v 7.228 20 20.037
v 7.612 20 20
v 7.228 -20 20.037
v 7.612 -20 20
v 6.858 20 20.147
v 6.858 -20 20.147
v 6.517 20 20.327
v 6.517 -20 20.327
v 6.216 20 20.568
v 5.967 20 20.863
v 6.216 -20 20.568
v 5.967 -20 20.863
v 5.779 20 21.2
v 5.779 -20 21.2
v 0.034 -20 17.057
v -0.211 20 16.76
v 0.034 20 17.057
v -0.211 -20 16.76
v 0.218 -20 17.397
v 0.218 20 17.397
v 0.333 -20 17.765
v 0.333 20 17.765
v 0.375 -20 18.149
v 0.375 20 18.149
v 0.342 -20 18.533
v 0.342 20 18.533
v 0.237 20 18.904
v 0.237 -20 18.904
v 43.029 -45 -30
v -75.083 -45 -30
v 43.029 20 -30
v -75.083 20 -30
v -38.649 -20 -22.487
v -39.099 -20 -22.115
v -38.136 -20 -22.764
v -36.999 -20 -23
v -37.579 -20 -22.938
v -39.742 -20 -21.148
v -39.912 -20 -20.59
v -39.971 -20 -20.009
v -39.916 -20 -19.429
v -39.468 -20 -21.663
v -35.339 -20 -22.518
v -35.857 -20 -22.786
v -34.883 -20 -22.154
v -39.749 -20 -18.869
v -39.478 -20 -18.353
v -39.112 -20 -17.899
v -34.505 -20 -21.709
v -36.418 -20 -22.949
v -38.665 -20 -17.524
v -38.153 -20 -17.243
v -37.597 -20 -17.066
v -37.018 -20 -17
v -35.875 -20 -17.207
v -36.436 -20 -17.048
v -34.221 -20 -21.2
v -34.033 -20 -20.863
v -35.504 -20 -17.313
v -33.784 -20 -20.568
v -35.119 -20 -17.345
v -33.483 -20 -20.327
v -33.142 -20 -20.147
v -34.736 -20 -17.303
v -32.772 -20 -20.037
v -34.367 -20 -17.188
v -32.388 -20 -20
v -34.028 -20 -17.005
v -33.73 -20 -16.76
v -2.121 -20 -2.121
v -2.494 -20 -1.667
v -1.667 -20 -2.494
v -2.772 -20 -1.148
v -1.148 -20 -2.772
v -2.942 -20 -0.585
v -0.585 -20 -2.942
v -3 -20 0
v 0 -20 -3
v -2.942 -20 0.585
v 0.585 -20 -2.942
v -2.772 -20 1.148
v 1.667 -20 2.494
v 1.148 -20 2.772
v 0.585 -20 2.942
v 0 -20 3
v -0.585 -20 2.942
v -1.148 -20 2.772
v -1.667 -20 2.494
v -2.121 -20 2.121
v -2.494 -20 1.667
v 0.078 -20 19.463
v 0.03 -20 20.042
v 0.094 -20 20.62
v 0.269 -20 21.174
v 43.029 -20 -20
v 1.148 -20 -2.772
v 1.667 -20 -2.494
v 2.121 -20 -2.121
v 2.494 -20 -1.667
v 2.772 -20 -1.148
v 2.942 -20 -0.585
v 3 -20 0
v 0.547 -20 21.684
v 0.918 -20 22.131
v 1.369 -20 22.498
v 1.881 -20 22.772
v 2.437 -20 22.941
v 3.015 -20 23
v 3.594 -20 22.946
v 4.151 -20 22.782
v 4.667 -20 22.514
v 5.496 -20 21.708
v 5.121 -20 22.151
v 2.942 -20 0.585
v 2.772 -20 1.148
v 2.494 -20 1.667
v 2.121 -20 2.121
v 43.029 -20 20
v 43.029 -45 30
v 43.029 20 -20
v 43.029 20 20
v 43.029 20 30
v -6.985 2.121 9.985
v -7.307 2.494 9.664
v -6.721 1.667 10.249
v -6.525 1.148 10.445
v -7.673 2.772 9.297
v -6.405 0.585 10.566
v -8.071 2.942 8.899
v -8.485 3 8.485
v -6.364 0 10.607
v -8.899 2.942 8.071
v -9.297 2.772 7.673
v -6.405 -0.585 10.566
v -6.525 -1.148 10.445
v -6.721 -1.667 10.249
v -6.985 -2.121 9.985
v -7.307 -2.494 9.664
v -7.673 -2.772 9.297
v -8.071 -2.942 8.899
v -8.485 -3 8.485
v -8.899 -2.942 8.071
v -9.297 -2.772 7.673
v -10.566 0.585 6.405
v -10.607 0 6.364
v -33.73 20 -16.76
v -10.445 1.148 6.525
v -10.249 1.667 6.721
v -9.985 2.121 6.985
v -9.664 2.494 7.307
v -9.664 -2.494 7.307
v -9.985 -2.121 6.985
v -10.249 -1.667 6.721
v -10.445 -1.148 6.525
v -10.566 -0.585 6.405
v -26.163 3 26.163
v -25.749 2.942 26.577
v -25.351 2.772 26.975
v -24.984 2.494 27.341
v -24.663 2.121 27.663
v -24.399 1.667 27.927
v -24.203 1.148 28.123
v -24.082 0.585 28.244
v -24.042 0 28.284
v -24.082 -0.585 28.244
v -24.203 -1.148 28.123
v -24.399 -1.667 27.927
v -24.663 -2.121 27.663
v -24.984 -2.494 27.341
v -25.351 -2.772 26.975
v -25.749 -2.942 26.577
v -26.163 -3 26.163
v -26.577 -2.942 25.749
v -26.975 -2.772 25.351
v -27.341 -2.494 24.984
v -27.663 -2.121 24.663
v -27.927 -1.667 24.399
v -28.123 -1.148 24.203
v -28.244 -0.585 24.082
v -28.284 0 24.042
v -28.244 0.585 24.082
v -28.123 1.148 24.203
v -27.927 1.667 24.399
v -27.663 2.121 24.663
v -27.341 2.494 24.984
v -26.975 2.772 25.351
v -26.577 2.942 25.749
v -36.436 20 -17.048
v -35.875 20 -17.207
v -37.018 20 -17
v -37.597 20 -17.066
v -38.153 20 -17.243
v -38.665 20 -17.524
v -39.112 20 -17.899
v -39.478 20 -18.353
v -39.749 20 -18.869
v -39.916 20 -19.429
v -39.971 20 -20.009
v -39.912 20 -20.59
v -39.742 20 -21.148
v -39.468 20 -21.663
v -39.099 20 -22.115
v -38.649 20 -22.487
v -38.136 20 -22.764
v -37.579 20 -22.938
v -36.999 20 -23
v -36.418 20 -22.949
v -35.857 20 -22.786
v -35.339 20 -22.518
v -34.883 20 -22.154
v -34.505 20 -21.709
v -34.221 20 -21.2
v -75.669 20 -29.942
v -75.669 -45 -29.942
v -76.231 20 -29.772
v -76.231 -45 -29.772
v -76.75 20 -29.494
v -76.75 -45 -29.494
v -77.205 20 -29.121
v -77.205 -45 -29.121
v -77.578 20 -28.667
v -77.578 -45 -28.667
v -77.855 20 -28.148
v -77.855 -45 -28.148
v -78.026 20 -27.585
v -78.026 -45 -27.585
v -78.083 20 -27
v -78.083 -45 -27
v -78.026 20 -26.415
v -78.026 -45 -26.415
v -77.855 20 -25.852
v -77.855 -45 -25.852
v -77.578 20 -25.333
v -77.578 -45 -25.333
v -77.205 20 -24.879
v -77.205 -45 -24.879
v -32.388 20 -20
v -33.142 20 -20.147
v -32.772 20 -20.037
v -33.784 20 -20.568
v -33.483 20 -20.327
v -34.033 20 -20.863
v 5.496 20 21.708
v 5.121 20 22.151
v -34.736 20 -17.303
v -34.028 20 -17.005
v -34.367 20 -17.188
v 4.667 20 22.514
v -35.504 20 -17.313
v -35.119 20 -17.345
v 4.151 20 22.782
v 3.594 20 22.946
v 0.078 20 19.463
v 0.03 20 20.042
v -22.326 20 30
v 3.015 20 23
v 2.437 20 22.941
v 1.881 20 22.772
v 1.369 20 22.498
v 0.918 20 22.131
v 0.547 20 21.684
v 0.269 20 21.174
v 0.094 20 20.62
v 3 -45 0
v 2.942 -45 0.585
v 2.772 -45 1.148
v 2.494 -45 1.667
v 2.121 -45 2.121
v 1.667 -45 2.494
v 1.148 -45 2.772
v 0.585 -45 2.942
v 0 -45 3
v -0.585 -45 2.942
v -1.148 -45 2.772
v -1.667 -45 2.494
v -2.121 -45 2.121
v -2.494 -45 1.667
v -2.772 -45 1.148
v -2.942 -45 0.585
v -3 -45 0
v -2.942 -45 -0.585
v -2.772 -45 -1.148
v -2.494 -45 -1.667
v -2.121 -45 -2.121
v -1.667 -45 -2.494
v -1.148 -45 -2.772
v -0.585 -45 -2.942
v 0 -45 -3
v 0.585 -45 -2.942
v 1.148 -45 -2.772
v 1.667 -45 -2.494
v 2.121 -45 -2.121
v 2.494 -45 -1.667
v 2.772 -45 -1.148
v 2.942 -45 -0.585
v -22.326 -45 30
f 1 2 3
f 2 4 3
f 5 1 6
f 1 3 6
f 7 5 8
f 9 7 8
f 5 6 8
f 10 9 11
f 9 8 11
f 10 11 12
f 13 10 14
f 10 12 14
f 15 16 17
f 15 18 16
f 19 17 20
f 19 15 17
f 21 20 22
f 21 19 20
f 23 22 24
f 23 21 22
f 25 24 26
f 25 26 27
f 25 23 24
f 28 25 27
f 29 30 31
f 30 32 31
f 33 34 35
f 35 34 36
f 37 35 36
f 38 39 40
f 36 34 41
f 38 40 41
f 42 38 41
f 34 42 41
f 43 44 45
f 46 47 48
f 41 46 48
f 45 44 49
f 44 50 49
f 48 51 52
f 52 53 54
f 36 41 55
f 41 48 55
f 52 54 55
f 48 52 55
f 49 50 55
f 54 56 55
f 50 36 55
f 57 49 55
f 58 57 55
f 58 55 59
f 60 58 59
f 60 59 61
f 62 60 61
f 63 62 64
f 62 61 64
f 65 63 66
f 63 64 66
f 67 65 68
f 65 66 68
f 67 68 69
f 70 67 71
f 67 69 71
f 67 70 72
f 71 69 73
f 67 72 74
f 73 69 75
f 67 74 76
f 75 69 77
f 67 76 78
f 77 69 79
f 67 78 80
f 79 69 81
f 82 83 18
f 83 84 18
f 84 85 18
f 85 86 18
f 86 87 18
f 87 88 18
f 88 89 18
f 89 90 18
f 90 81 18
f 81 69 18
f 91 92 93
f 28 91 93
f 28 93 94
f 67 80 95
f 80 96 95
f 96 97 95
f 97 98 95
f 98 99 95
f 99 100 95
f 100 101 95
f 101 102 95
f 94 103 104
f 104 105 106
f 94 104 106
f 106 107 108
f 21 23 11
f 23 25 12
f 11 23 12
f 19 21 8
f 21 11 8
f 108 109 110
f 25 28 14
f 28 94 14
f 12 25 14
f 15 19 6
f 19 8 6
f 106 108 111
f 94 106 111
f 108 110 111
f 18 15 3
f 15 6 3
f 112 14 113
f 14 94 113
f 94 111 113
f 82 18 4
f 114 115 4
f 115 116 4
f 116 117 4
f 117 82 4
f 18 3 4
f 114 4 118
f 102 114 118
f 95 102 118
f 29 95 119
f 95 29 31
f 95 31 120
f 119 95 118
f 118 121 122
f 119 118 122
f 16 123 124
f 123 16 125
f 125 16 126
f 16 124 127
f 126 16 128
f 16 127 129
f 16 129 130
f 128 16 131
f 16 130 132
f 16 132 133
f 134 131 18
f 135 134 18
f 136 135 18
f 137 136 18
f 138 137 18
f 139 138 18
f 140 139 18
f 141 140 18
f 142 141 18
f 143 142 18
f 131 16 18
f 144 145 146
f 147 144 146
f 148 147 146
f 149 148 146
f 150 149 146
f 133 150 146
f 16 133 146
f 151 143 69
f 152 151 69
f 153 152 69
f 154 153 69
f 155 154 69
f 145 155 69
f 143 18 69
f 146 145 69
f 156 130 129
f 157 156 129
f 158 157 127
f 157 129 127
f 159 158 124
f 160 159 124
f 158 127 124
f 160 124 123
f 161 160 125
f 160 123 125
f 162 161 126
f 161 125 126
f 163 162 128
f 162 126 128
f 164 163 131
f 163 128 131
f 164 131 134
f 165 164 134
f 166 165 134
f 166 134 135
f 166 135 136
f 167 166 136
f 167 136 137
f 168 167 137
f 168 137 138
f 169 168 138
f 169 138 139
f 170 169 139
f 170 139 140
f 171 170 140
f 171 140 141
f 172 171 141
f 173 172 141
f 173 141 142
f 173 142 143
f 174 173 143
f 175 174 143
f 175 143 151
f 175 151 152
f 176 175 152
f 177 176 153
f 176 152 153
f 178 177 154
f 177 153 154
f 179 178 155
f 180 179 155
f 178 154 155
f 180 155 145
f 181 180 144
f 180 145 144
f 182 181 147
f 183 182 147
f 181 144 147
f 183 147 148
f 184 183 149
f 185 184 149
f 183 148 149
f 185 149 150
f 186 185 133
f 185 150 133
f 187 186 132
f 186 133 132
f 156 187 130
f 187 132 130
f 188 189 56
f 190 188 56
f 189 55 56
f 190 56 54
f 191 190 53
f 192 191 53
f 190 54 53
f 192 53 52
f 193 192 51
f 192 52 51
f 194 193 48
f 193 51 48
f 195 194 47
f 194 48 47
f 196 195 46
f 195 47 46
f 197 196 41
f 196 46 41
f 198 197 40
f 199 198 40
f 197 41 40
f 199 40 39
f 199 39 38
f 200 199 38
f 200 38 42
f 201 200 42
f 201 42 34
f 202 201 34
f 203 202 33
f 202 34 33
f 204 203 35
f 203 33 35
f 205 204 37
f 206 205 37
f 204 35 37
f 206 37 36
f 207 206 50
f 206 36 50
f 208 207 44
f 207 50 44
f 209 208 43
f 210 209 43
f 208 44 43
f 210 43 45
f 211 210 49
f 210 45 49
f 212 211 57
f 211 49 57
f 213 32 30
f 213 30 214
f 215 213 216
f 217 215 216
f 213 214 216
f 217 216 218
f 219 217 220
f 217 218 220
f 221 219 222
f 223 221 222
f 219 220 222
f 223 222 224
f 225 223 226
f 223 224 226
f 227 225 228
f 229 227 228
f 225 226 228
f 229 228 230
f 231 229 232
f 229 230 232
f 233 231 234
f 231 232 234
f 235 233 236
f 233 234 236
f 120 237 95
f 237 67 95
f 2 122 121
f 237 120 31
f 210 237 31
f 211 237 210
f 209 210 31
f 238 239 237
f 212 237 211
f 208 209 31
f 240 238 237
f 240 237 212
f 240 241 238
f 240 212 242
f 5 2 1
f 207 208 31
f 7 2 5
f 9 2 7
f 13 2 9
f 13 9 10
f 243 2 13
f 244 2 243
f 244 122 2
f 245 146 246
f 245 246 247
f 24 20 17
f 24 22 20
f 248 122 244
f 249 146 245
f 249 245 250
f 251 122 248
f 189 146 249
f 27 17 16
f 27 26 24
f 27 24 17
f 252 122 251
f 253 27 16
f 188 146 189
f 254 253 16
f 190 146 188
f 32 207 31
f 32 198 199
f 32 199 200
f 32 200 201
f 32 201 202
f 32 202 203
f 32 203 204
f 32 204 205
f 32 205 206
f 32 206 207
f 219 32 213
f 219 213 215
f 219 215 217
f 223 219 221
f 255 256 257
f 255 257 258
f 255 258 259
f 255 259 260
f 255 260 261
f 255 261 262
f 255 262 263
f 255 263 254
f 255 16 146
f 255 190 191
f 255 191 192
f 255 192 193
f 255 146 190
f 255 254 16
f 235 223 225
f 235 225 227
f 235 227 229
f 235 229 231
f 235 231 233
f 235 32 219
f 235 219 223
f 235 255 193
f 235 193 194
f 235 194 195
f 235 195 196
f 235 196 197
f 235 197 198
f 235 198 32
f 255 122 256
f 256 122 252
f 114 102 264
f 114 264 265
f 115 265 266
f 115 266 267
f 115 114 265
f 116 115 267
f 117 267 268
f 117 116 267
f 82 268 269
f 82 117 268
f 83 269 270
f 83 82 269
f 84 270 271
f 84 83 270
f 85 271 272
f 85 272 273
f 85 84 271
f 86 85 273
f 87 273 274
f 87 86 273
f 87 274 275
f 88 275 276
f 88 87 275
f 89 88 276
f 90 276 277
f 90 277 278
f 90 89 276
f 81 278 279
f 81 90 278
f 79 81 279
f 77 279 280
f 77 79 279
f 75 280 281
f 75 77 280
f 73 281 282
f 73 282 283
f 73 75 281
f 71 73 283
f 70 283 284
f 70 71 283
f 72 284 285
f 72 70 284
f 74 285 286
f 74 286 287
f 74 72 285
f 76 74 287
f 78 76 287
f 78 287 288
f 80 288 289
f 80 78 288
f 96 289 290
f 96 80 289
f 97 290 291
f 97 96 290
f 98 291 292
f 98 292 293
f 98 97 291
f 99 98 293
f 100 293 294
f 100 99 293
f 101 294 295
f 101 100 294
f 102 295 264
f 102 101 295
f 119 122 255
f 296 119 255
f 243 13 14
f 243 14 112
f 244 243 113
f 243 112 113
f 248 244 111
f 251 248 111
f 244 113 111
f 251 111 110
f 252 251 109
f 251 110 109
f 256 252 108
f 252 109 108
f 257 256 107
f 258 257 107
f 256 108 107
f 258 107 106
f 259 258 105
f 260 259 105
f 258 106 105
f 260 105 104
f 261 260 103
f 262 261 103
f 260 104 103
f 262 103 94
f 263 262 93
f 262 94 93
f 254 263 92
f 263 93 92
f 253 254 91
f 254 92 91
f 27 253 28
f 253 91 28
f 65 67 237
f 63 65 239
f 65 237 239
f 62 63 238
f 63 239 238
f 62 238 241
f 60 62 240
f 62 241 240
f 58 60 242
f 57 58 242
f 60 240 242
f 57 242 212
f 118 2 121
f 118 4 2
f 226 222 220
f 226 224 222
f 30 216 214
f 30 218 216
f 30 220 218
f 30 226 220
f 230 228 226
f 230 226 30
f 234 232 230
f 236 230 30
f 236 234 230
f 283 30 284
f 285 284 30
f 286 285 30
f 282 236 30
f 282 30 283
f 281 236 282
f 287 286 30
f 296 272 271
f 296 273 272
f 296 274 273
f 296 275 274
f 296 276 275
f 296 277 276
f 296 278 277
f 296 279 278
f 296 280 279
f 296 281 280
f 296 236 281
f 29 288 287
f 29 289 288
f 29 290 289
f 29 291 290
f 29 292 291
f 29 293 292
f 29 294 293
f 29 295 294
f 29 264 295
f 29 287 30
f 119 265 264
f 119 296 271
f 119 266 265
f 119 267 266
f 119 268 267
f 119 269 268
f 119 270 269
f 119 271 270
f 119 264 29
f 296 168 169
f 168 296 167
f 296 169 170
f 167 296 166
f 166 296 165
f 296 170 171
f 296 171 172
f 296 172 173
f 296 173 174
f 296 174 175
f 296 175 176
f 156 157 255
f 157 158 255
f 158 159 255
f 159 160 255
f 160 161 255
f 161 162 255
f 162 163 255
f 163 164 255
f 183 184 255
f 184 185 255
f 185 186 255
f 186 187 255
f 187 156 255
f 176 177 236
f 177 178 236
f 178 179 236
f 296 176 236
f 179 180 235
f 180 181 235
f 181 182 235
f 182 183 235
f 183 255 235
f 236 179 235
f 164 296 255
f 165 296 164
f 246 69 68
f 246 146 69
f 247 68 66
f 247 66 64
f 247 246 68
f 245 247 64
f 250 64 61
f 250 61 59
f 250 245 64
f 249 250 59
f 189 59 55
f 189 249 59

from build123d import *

# Parameters (mm, degrees)
PAD_DEPTH    = 20
SKETCH001_R  = 3
PAD001_DEPTH = 25
SKETCH002_R  = 3
POCKET_DEPTH = 79.427407
FILLET_R     = 2
FILLET001_R  = 3


with BuildPart() as part:
    # Sketch → Pad (new body, symmetric)
    with BuildSketch(Plane.XZ):
        with BuildLine():
            Line((0.908117, 17.87868), (-34.849242, -17.87868))
            ThreePointArc((-34.849242, -17.87868), (-39.742201, -21.14805), (-33.970563, -20))
            Line((-33.970563, -20), (43.029437, -20))
            Line((43.029437, -20), (43.029437, -30))
            Line((43.029437, -30), (-82.325902, -30))
            Line((-22.325902, 30), (-82.325902, -30))
            Line((43.029437, 30), (-22.325902, 30))
            Line((43.029437, 20), (43.029437, 30))
            Line((6.029437, 20), (43.029437, 20))
            ThreePointArc((6.029437, 20), (1.881387, 22.771639), (0.908117, 17.87868))
        make_face()
    extrude(amount=PAD_DEPTH, both=True)

    # Sketch001 → Pad001 (join)
    with BuildSketch(Plane.XZ.offset(20)):
        Polygon((43.029437, -20), (43.029437, 20), (43.029437, 30), (-22.325902, 30), (-82.325902, -30), (43.029437, -30), align=None)
        Circle(SKETCH001_R, mode=Mode.SUBTRACT)
    extrude(amount=PAD001_DEPTH)

    # Sketch002 → Pocket (cut, through all)
    with BuildSketch(Plane(origin=(0, 0, 0), x_dir=(0, 1, 0), z_dir=(0.707107, 0, -0.707107))):
        Circle(SKETCH002_R)
    extrude(amount=-POCKET_DEPTH, mode=Mode.SUBTRACT)

    # Fillet
    fillet_edges = [part.edges().sort_by_distance(p)[0] for p in [
        (-33.970563, 0, -20),
        (-34.849242, 0, -17.87868),
        (0.908117, 0, 17.87868),
        (6.029437, 0, 20),
    ]]
    fillet(fillet_edges, radius=FILLET_R)

    # Fillet001
    fillet001_edges = [part.edges().sort_by_distance(p)[0] for p in [
        (-82.325902, -32.5, -30),
        (-82.325902, 0, -30),
    ]]
    fillet(fillet001_edges, radius=FILLET001_R)


solid = part.part
